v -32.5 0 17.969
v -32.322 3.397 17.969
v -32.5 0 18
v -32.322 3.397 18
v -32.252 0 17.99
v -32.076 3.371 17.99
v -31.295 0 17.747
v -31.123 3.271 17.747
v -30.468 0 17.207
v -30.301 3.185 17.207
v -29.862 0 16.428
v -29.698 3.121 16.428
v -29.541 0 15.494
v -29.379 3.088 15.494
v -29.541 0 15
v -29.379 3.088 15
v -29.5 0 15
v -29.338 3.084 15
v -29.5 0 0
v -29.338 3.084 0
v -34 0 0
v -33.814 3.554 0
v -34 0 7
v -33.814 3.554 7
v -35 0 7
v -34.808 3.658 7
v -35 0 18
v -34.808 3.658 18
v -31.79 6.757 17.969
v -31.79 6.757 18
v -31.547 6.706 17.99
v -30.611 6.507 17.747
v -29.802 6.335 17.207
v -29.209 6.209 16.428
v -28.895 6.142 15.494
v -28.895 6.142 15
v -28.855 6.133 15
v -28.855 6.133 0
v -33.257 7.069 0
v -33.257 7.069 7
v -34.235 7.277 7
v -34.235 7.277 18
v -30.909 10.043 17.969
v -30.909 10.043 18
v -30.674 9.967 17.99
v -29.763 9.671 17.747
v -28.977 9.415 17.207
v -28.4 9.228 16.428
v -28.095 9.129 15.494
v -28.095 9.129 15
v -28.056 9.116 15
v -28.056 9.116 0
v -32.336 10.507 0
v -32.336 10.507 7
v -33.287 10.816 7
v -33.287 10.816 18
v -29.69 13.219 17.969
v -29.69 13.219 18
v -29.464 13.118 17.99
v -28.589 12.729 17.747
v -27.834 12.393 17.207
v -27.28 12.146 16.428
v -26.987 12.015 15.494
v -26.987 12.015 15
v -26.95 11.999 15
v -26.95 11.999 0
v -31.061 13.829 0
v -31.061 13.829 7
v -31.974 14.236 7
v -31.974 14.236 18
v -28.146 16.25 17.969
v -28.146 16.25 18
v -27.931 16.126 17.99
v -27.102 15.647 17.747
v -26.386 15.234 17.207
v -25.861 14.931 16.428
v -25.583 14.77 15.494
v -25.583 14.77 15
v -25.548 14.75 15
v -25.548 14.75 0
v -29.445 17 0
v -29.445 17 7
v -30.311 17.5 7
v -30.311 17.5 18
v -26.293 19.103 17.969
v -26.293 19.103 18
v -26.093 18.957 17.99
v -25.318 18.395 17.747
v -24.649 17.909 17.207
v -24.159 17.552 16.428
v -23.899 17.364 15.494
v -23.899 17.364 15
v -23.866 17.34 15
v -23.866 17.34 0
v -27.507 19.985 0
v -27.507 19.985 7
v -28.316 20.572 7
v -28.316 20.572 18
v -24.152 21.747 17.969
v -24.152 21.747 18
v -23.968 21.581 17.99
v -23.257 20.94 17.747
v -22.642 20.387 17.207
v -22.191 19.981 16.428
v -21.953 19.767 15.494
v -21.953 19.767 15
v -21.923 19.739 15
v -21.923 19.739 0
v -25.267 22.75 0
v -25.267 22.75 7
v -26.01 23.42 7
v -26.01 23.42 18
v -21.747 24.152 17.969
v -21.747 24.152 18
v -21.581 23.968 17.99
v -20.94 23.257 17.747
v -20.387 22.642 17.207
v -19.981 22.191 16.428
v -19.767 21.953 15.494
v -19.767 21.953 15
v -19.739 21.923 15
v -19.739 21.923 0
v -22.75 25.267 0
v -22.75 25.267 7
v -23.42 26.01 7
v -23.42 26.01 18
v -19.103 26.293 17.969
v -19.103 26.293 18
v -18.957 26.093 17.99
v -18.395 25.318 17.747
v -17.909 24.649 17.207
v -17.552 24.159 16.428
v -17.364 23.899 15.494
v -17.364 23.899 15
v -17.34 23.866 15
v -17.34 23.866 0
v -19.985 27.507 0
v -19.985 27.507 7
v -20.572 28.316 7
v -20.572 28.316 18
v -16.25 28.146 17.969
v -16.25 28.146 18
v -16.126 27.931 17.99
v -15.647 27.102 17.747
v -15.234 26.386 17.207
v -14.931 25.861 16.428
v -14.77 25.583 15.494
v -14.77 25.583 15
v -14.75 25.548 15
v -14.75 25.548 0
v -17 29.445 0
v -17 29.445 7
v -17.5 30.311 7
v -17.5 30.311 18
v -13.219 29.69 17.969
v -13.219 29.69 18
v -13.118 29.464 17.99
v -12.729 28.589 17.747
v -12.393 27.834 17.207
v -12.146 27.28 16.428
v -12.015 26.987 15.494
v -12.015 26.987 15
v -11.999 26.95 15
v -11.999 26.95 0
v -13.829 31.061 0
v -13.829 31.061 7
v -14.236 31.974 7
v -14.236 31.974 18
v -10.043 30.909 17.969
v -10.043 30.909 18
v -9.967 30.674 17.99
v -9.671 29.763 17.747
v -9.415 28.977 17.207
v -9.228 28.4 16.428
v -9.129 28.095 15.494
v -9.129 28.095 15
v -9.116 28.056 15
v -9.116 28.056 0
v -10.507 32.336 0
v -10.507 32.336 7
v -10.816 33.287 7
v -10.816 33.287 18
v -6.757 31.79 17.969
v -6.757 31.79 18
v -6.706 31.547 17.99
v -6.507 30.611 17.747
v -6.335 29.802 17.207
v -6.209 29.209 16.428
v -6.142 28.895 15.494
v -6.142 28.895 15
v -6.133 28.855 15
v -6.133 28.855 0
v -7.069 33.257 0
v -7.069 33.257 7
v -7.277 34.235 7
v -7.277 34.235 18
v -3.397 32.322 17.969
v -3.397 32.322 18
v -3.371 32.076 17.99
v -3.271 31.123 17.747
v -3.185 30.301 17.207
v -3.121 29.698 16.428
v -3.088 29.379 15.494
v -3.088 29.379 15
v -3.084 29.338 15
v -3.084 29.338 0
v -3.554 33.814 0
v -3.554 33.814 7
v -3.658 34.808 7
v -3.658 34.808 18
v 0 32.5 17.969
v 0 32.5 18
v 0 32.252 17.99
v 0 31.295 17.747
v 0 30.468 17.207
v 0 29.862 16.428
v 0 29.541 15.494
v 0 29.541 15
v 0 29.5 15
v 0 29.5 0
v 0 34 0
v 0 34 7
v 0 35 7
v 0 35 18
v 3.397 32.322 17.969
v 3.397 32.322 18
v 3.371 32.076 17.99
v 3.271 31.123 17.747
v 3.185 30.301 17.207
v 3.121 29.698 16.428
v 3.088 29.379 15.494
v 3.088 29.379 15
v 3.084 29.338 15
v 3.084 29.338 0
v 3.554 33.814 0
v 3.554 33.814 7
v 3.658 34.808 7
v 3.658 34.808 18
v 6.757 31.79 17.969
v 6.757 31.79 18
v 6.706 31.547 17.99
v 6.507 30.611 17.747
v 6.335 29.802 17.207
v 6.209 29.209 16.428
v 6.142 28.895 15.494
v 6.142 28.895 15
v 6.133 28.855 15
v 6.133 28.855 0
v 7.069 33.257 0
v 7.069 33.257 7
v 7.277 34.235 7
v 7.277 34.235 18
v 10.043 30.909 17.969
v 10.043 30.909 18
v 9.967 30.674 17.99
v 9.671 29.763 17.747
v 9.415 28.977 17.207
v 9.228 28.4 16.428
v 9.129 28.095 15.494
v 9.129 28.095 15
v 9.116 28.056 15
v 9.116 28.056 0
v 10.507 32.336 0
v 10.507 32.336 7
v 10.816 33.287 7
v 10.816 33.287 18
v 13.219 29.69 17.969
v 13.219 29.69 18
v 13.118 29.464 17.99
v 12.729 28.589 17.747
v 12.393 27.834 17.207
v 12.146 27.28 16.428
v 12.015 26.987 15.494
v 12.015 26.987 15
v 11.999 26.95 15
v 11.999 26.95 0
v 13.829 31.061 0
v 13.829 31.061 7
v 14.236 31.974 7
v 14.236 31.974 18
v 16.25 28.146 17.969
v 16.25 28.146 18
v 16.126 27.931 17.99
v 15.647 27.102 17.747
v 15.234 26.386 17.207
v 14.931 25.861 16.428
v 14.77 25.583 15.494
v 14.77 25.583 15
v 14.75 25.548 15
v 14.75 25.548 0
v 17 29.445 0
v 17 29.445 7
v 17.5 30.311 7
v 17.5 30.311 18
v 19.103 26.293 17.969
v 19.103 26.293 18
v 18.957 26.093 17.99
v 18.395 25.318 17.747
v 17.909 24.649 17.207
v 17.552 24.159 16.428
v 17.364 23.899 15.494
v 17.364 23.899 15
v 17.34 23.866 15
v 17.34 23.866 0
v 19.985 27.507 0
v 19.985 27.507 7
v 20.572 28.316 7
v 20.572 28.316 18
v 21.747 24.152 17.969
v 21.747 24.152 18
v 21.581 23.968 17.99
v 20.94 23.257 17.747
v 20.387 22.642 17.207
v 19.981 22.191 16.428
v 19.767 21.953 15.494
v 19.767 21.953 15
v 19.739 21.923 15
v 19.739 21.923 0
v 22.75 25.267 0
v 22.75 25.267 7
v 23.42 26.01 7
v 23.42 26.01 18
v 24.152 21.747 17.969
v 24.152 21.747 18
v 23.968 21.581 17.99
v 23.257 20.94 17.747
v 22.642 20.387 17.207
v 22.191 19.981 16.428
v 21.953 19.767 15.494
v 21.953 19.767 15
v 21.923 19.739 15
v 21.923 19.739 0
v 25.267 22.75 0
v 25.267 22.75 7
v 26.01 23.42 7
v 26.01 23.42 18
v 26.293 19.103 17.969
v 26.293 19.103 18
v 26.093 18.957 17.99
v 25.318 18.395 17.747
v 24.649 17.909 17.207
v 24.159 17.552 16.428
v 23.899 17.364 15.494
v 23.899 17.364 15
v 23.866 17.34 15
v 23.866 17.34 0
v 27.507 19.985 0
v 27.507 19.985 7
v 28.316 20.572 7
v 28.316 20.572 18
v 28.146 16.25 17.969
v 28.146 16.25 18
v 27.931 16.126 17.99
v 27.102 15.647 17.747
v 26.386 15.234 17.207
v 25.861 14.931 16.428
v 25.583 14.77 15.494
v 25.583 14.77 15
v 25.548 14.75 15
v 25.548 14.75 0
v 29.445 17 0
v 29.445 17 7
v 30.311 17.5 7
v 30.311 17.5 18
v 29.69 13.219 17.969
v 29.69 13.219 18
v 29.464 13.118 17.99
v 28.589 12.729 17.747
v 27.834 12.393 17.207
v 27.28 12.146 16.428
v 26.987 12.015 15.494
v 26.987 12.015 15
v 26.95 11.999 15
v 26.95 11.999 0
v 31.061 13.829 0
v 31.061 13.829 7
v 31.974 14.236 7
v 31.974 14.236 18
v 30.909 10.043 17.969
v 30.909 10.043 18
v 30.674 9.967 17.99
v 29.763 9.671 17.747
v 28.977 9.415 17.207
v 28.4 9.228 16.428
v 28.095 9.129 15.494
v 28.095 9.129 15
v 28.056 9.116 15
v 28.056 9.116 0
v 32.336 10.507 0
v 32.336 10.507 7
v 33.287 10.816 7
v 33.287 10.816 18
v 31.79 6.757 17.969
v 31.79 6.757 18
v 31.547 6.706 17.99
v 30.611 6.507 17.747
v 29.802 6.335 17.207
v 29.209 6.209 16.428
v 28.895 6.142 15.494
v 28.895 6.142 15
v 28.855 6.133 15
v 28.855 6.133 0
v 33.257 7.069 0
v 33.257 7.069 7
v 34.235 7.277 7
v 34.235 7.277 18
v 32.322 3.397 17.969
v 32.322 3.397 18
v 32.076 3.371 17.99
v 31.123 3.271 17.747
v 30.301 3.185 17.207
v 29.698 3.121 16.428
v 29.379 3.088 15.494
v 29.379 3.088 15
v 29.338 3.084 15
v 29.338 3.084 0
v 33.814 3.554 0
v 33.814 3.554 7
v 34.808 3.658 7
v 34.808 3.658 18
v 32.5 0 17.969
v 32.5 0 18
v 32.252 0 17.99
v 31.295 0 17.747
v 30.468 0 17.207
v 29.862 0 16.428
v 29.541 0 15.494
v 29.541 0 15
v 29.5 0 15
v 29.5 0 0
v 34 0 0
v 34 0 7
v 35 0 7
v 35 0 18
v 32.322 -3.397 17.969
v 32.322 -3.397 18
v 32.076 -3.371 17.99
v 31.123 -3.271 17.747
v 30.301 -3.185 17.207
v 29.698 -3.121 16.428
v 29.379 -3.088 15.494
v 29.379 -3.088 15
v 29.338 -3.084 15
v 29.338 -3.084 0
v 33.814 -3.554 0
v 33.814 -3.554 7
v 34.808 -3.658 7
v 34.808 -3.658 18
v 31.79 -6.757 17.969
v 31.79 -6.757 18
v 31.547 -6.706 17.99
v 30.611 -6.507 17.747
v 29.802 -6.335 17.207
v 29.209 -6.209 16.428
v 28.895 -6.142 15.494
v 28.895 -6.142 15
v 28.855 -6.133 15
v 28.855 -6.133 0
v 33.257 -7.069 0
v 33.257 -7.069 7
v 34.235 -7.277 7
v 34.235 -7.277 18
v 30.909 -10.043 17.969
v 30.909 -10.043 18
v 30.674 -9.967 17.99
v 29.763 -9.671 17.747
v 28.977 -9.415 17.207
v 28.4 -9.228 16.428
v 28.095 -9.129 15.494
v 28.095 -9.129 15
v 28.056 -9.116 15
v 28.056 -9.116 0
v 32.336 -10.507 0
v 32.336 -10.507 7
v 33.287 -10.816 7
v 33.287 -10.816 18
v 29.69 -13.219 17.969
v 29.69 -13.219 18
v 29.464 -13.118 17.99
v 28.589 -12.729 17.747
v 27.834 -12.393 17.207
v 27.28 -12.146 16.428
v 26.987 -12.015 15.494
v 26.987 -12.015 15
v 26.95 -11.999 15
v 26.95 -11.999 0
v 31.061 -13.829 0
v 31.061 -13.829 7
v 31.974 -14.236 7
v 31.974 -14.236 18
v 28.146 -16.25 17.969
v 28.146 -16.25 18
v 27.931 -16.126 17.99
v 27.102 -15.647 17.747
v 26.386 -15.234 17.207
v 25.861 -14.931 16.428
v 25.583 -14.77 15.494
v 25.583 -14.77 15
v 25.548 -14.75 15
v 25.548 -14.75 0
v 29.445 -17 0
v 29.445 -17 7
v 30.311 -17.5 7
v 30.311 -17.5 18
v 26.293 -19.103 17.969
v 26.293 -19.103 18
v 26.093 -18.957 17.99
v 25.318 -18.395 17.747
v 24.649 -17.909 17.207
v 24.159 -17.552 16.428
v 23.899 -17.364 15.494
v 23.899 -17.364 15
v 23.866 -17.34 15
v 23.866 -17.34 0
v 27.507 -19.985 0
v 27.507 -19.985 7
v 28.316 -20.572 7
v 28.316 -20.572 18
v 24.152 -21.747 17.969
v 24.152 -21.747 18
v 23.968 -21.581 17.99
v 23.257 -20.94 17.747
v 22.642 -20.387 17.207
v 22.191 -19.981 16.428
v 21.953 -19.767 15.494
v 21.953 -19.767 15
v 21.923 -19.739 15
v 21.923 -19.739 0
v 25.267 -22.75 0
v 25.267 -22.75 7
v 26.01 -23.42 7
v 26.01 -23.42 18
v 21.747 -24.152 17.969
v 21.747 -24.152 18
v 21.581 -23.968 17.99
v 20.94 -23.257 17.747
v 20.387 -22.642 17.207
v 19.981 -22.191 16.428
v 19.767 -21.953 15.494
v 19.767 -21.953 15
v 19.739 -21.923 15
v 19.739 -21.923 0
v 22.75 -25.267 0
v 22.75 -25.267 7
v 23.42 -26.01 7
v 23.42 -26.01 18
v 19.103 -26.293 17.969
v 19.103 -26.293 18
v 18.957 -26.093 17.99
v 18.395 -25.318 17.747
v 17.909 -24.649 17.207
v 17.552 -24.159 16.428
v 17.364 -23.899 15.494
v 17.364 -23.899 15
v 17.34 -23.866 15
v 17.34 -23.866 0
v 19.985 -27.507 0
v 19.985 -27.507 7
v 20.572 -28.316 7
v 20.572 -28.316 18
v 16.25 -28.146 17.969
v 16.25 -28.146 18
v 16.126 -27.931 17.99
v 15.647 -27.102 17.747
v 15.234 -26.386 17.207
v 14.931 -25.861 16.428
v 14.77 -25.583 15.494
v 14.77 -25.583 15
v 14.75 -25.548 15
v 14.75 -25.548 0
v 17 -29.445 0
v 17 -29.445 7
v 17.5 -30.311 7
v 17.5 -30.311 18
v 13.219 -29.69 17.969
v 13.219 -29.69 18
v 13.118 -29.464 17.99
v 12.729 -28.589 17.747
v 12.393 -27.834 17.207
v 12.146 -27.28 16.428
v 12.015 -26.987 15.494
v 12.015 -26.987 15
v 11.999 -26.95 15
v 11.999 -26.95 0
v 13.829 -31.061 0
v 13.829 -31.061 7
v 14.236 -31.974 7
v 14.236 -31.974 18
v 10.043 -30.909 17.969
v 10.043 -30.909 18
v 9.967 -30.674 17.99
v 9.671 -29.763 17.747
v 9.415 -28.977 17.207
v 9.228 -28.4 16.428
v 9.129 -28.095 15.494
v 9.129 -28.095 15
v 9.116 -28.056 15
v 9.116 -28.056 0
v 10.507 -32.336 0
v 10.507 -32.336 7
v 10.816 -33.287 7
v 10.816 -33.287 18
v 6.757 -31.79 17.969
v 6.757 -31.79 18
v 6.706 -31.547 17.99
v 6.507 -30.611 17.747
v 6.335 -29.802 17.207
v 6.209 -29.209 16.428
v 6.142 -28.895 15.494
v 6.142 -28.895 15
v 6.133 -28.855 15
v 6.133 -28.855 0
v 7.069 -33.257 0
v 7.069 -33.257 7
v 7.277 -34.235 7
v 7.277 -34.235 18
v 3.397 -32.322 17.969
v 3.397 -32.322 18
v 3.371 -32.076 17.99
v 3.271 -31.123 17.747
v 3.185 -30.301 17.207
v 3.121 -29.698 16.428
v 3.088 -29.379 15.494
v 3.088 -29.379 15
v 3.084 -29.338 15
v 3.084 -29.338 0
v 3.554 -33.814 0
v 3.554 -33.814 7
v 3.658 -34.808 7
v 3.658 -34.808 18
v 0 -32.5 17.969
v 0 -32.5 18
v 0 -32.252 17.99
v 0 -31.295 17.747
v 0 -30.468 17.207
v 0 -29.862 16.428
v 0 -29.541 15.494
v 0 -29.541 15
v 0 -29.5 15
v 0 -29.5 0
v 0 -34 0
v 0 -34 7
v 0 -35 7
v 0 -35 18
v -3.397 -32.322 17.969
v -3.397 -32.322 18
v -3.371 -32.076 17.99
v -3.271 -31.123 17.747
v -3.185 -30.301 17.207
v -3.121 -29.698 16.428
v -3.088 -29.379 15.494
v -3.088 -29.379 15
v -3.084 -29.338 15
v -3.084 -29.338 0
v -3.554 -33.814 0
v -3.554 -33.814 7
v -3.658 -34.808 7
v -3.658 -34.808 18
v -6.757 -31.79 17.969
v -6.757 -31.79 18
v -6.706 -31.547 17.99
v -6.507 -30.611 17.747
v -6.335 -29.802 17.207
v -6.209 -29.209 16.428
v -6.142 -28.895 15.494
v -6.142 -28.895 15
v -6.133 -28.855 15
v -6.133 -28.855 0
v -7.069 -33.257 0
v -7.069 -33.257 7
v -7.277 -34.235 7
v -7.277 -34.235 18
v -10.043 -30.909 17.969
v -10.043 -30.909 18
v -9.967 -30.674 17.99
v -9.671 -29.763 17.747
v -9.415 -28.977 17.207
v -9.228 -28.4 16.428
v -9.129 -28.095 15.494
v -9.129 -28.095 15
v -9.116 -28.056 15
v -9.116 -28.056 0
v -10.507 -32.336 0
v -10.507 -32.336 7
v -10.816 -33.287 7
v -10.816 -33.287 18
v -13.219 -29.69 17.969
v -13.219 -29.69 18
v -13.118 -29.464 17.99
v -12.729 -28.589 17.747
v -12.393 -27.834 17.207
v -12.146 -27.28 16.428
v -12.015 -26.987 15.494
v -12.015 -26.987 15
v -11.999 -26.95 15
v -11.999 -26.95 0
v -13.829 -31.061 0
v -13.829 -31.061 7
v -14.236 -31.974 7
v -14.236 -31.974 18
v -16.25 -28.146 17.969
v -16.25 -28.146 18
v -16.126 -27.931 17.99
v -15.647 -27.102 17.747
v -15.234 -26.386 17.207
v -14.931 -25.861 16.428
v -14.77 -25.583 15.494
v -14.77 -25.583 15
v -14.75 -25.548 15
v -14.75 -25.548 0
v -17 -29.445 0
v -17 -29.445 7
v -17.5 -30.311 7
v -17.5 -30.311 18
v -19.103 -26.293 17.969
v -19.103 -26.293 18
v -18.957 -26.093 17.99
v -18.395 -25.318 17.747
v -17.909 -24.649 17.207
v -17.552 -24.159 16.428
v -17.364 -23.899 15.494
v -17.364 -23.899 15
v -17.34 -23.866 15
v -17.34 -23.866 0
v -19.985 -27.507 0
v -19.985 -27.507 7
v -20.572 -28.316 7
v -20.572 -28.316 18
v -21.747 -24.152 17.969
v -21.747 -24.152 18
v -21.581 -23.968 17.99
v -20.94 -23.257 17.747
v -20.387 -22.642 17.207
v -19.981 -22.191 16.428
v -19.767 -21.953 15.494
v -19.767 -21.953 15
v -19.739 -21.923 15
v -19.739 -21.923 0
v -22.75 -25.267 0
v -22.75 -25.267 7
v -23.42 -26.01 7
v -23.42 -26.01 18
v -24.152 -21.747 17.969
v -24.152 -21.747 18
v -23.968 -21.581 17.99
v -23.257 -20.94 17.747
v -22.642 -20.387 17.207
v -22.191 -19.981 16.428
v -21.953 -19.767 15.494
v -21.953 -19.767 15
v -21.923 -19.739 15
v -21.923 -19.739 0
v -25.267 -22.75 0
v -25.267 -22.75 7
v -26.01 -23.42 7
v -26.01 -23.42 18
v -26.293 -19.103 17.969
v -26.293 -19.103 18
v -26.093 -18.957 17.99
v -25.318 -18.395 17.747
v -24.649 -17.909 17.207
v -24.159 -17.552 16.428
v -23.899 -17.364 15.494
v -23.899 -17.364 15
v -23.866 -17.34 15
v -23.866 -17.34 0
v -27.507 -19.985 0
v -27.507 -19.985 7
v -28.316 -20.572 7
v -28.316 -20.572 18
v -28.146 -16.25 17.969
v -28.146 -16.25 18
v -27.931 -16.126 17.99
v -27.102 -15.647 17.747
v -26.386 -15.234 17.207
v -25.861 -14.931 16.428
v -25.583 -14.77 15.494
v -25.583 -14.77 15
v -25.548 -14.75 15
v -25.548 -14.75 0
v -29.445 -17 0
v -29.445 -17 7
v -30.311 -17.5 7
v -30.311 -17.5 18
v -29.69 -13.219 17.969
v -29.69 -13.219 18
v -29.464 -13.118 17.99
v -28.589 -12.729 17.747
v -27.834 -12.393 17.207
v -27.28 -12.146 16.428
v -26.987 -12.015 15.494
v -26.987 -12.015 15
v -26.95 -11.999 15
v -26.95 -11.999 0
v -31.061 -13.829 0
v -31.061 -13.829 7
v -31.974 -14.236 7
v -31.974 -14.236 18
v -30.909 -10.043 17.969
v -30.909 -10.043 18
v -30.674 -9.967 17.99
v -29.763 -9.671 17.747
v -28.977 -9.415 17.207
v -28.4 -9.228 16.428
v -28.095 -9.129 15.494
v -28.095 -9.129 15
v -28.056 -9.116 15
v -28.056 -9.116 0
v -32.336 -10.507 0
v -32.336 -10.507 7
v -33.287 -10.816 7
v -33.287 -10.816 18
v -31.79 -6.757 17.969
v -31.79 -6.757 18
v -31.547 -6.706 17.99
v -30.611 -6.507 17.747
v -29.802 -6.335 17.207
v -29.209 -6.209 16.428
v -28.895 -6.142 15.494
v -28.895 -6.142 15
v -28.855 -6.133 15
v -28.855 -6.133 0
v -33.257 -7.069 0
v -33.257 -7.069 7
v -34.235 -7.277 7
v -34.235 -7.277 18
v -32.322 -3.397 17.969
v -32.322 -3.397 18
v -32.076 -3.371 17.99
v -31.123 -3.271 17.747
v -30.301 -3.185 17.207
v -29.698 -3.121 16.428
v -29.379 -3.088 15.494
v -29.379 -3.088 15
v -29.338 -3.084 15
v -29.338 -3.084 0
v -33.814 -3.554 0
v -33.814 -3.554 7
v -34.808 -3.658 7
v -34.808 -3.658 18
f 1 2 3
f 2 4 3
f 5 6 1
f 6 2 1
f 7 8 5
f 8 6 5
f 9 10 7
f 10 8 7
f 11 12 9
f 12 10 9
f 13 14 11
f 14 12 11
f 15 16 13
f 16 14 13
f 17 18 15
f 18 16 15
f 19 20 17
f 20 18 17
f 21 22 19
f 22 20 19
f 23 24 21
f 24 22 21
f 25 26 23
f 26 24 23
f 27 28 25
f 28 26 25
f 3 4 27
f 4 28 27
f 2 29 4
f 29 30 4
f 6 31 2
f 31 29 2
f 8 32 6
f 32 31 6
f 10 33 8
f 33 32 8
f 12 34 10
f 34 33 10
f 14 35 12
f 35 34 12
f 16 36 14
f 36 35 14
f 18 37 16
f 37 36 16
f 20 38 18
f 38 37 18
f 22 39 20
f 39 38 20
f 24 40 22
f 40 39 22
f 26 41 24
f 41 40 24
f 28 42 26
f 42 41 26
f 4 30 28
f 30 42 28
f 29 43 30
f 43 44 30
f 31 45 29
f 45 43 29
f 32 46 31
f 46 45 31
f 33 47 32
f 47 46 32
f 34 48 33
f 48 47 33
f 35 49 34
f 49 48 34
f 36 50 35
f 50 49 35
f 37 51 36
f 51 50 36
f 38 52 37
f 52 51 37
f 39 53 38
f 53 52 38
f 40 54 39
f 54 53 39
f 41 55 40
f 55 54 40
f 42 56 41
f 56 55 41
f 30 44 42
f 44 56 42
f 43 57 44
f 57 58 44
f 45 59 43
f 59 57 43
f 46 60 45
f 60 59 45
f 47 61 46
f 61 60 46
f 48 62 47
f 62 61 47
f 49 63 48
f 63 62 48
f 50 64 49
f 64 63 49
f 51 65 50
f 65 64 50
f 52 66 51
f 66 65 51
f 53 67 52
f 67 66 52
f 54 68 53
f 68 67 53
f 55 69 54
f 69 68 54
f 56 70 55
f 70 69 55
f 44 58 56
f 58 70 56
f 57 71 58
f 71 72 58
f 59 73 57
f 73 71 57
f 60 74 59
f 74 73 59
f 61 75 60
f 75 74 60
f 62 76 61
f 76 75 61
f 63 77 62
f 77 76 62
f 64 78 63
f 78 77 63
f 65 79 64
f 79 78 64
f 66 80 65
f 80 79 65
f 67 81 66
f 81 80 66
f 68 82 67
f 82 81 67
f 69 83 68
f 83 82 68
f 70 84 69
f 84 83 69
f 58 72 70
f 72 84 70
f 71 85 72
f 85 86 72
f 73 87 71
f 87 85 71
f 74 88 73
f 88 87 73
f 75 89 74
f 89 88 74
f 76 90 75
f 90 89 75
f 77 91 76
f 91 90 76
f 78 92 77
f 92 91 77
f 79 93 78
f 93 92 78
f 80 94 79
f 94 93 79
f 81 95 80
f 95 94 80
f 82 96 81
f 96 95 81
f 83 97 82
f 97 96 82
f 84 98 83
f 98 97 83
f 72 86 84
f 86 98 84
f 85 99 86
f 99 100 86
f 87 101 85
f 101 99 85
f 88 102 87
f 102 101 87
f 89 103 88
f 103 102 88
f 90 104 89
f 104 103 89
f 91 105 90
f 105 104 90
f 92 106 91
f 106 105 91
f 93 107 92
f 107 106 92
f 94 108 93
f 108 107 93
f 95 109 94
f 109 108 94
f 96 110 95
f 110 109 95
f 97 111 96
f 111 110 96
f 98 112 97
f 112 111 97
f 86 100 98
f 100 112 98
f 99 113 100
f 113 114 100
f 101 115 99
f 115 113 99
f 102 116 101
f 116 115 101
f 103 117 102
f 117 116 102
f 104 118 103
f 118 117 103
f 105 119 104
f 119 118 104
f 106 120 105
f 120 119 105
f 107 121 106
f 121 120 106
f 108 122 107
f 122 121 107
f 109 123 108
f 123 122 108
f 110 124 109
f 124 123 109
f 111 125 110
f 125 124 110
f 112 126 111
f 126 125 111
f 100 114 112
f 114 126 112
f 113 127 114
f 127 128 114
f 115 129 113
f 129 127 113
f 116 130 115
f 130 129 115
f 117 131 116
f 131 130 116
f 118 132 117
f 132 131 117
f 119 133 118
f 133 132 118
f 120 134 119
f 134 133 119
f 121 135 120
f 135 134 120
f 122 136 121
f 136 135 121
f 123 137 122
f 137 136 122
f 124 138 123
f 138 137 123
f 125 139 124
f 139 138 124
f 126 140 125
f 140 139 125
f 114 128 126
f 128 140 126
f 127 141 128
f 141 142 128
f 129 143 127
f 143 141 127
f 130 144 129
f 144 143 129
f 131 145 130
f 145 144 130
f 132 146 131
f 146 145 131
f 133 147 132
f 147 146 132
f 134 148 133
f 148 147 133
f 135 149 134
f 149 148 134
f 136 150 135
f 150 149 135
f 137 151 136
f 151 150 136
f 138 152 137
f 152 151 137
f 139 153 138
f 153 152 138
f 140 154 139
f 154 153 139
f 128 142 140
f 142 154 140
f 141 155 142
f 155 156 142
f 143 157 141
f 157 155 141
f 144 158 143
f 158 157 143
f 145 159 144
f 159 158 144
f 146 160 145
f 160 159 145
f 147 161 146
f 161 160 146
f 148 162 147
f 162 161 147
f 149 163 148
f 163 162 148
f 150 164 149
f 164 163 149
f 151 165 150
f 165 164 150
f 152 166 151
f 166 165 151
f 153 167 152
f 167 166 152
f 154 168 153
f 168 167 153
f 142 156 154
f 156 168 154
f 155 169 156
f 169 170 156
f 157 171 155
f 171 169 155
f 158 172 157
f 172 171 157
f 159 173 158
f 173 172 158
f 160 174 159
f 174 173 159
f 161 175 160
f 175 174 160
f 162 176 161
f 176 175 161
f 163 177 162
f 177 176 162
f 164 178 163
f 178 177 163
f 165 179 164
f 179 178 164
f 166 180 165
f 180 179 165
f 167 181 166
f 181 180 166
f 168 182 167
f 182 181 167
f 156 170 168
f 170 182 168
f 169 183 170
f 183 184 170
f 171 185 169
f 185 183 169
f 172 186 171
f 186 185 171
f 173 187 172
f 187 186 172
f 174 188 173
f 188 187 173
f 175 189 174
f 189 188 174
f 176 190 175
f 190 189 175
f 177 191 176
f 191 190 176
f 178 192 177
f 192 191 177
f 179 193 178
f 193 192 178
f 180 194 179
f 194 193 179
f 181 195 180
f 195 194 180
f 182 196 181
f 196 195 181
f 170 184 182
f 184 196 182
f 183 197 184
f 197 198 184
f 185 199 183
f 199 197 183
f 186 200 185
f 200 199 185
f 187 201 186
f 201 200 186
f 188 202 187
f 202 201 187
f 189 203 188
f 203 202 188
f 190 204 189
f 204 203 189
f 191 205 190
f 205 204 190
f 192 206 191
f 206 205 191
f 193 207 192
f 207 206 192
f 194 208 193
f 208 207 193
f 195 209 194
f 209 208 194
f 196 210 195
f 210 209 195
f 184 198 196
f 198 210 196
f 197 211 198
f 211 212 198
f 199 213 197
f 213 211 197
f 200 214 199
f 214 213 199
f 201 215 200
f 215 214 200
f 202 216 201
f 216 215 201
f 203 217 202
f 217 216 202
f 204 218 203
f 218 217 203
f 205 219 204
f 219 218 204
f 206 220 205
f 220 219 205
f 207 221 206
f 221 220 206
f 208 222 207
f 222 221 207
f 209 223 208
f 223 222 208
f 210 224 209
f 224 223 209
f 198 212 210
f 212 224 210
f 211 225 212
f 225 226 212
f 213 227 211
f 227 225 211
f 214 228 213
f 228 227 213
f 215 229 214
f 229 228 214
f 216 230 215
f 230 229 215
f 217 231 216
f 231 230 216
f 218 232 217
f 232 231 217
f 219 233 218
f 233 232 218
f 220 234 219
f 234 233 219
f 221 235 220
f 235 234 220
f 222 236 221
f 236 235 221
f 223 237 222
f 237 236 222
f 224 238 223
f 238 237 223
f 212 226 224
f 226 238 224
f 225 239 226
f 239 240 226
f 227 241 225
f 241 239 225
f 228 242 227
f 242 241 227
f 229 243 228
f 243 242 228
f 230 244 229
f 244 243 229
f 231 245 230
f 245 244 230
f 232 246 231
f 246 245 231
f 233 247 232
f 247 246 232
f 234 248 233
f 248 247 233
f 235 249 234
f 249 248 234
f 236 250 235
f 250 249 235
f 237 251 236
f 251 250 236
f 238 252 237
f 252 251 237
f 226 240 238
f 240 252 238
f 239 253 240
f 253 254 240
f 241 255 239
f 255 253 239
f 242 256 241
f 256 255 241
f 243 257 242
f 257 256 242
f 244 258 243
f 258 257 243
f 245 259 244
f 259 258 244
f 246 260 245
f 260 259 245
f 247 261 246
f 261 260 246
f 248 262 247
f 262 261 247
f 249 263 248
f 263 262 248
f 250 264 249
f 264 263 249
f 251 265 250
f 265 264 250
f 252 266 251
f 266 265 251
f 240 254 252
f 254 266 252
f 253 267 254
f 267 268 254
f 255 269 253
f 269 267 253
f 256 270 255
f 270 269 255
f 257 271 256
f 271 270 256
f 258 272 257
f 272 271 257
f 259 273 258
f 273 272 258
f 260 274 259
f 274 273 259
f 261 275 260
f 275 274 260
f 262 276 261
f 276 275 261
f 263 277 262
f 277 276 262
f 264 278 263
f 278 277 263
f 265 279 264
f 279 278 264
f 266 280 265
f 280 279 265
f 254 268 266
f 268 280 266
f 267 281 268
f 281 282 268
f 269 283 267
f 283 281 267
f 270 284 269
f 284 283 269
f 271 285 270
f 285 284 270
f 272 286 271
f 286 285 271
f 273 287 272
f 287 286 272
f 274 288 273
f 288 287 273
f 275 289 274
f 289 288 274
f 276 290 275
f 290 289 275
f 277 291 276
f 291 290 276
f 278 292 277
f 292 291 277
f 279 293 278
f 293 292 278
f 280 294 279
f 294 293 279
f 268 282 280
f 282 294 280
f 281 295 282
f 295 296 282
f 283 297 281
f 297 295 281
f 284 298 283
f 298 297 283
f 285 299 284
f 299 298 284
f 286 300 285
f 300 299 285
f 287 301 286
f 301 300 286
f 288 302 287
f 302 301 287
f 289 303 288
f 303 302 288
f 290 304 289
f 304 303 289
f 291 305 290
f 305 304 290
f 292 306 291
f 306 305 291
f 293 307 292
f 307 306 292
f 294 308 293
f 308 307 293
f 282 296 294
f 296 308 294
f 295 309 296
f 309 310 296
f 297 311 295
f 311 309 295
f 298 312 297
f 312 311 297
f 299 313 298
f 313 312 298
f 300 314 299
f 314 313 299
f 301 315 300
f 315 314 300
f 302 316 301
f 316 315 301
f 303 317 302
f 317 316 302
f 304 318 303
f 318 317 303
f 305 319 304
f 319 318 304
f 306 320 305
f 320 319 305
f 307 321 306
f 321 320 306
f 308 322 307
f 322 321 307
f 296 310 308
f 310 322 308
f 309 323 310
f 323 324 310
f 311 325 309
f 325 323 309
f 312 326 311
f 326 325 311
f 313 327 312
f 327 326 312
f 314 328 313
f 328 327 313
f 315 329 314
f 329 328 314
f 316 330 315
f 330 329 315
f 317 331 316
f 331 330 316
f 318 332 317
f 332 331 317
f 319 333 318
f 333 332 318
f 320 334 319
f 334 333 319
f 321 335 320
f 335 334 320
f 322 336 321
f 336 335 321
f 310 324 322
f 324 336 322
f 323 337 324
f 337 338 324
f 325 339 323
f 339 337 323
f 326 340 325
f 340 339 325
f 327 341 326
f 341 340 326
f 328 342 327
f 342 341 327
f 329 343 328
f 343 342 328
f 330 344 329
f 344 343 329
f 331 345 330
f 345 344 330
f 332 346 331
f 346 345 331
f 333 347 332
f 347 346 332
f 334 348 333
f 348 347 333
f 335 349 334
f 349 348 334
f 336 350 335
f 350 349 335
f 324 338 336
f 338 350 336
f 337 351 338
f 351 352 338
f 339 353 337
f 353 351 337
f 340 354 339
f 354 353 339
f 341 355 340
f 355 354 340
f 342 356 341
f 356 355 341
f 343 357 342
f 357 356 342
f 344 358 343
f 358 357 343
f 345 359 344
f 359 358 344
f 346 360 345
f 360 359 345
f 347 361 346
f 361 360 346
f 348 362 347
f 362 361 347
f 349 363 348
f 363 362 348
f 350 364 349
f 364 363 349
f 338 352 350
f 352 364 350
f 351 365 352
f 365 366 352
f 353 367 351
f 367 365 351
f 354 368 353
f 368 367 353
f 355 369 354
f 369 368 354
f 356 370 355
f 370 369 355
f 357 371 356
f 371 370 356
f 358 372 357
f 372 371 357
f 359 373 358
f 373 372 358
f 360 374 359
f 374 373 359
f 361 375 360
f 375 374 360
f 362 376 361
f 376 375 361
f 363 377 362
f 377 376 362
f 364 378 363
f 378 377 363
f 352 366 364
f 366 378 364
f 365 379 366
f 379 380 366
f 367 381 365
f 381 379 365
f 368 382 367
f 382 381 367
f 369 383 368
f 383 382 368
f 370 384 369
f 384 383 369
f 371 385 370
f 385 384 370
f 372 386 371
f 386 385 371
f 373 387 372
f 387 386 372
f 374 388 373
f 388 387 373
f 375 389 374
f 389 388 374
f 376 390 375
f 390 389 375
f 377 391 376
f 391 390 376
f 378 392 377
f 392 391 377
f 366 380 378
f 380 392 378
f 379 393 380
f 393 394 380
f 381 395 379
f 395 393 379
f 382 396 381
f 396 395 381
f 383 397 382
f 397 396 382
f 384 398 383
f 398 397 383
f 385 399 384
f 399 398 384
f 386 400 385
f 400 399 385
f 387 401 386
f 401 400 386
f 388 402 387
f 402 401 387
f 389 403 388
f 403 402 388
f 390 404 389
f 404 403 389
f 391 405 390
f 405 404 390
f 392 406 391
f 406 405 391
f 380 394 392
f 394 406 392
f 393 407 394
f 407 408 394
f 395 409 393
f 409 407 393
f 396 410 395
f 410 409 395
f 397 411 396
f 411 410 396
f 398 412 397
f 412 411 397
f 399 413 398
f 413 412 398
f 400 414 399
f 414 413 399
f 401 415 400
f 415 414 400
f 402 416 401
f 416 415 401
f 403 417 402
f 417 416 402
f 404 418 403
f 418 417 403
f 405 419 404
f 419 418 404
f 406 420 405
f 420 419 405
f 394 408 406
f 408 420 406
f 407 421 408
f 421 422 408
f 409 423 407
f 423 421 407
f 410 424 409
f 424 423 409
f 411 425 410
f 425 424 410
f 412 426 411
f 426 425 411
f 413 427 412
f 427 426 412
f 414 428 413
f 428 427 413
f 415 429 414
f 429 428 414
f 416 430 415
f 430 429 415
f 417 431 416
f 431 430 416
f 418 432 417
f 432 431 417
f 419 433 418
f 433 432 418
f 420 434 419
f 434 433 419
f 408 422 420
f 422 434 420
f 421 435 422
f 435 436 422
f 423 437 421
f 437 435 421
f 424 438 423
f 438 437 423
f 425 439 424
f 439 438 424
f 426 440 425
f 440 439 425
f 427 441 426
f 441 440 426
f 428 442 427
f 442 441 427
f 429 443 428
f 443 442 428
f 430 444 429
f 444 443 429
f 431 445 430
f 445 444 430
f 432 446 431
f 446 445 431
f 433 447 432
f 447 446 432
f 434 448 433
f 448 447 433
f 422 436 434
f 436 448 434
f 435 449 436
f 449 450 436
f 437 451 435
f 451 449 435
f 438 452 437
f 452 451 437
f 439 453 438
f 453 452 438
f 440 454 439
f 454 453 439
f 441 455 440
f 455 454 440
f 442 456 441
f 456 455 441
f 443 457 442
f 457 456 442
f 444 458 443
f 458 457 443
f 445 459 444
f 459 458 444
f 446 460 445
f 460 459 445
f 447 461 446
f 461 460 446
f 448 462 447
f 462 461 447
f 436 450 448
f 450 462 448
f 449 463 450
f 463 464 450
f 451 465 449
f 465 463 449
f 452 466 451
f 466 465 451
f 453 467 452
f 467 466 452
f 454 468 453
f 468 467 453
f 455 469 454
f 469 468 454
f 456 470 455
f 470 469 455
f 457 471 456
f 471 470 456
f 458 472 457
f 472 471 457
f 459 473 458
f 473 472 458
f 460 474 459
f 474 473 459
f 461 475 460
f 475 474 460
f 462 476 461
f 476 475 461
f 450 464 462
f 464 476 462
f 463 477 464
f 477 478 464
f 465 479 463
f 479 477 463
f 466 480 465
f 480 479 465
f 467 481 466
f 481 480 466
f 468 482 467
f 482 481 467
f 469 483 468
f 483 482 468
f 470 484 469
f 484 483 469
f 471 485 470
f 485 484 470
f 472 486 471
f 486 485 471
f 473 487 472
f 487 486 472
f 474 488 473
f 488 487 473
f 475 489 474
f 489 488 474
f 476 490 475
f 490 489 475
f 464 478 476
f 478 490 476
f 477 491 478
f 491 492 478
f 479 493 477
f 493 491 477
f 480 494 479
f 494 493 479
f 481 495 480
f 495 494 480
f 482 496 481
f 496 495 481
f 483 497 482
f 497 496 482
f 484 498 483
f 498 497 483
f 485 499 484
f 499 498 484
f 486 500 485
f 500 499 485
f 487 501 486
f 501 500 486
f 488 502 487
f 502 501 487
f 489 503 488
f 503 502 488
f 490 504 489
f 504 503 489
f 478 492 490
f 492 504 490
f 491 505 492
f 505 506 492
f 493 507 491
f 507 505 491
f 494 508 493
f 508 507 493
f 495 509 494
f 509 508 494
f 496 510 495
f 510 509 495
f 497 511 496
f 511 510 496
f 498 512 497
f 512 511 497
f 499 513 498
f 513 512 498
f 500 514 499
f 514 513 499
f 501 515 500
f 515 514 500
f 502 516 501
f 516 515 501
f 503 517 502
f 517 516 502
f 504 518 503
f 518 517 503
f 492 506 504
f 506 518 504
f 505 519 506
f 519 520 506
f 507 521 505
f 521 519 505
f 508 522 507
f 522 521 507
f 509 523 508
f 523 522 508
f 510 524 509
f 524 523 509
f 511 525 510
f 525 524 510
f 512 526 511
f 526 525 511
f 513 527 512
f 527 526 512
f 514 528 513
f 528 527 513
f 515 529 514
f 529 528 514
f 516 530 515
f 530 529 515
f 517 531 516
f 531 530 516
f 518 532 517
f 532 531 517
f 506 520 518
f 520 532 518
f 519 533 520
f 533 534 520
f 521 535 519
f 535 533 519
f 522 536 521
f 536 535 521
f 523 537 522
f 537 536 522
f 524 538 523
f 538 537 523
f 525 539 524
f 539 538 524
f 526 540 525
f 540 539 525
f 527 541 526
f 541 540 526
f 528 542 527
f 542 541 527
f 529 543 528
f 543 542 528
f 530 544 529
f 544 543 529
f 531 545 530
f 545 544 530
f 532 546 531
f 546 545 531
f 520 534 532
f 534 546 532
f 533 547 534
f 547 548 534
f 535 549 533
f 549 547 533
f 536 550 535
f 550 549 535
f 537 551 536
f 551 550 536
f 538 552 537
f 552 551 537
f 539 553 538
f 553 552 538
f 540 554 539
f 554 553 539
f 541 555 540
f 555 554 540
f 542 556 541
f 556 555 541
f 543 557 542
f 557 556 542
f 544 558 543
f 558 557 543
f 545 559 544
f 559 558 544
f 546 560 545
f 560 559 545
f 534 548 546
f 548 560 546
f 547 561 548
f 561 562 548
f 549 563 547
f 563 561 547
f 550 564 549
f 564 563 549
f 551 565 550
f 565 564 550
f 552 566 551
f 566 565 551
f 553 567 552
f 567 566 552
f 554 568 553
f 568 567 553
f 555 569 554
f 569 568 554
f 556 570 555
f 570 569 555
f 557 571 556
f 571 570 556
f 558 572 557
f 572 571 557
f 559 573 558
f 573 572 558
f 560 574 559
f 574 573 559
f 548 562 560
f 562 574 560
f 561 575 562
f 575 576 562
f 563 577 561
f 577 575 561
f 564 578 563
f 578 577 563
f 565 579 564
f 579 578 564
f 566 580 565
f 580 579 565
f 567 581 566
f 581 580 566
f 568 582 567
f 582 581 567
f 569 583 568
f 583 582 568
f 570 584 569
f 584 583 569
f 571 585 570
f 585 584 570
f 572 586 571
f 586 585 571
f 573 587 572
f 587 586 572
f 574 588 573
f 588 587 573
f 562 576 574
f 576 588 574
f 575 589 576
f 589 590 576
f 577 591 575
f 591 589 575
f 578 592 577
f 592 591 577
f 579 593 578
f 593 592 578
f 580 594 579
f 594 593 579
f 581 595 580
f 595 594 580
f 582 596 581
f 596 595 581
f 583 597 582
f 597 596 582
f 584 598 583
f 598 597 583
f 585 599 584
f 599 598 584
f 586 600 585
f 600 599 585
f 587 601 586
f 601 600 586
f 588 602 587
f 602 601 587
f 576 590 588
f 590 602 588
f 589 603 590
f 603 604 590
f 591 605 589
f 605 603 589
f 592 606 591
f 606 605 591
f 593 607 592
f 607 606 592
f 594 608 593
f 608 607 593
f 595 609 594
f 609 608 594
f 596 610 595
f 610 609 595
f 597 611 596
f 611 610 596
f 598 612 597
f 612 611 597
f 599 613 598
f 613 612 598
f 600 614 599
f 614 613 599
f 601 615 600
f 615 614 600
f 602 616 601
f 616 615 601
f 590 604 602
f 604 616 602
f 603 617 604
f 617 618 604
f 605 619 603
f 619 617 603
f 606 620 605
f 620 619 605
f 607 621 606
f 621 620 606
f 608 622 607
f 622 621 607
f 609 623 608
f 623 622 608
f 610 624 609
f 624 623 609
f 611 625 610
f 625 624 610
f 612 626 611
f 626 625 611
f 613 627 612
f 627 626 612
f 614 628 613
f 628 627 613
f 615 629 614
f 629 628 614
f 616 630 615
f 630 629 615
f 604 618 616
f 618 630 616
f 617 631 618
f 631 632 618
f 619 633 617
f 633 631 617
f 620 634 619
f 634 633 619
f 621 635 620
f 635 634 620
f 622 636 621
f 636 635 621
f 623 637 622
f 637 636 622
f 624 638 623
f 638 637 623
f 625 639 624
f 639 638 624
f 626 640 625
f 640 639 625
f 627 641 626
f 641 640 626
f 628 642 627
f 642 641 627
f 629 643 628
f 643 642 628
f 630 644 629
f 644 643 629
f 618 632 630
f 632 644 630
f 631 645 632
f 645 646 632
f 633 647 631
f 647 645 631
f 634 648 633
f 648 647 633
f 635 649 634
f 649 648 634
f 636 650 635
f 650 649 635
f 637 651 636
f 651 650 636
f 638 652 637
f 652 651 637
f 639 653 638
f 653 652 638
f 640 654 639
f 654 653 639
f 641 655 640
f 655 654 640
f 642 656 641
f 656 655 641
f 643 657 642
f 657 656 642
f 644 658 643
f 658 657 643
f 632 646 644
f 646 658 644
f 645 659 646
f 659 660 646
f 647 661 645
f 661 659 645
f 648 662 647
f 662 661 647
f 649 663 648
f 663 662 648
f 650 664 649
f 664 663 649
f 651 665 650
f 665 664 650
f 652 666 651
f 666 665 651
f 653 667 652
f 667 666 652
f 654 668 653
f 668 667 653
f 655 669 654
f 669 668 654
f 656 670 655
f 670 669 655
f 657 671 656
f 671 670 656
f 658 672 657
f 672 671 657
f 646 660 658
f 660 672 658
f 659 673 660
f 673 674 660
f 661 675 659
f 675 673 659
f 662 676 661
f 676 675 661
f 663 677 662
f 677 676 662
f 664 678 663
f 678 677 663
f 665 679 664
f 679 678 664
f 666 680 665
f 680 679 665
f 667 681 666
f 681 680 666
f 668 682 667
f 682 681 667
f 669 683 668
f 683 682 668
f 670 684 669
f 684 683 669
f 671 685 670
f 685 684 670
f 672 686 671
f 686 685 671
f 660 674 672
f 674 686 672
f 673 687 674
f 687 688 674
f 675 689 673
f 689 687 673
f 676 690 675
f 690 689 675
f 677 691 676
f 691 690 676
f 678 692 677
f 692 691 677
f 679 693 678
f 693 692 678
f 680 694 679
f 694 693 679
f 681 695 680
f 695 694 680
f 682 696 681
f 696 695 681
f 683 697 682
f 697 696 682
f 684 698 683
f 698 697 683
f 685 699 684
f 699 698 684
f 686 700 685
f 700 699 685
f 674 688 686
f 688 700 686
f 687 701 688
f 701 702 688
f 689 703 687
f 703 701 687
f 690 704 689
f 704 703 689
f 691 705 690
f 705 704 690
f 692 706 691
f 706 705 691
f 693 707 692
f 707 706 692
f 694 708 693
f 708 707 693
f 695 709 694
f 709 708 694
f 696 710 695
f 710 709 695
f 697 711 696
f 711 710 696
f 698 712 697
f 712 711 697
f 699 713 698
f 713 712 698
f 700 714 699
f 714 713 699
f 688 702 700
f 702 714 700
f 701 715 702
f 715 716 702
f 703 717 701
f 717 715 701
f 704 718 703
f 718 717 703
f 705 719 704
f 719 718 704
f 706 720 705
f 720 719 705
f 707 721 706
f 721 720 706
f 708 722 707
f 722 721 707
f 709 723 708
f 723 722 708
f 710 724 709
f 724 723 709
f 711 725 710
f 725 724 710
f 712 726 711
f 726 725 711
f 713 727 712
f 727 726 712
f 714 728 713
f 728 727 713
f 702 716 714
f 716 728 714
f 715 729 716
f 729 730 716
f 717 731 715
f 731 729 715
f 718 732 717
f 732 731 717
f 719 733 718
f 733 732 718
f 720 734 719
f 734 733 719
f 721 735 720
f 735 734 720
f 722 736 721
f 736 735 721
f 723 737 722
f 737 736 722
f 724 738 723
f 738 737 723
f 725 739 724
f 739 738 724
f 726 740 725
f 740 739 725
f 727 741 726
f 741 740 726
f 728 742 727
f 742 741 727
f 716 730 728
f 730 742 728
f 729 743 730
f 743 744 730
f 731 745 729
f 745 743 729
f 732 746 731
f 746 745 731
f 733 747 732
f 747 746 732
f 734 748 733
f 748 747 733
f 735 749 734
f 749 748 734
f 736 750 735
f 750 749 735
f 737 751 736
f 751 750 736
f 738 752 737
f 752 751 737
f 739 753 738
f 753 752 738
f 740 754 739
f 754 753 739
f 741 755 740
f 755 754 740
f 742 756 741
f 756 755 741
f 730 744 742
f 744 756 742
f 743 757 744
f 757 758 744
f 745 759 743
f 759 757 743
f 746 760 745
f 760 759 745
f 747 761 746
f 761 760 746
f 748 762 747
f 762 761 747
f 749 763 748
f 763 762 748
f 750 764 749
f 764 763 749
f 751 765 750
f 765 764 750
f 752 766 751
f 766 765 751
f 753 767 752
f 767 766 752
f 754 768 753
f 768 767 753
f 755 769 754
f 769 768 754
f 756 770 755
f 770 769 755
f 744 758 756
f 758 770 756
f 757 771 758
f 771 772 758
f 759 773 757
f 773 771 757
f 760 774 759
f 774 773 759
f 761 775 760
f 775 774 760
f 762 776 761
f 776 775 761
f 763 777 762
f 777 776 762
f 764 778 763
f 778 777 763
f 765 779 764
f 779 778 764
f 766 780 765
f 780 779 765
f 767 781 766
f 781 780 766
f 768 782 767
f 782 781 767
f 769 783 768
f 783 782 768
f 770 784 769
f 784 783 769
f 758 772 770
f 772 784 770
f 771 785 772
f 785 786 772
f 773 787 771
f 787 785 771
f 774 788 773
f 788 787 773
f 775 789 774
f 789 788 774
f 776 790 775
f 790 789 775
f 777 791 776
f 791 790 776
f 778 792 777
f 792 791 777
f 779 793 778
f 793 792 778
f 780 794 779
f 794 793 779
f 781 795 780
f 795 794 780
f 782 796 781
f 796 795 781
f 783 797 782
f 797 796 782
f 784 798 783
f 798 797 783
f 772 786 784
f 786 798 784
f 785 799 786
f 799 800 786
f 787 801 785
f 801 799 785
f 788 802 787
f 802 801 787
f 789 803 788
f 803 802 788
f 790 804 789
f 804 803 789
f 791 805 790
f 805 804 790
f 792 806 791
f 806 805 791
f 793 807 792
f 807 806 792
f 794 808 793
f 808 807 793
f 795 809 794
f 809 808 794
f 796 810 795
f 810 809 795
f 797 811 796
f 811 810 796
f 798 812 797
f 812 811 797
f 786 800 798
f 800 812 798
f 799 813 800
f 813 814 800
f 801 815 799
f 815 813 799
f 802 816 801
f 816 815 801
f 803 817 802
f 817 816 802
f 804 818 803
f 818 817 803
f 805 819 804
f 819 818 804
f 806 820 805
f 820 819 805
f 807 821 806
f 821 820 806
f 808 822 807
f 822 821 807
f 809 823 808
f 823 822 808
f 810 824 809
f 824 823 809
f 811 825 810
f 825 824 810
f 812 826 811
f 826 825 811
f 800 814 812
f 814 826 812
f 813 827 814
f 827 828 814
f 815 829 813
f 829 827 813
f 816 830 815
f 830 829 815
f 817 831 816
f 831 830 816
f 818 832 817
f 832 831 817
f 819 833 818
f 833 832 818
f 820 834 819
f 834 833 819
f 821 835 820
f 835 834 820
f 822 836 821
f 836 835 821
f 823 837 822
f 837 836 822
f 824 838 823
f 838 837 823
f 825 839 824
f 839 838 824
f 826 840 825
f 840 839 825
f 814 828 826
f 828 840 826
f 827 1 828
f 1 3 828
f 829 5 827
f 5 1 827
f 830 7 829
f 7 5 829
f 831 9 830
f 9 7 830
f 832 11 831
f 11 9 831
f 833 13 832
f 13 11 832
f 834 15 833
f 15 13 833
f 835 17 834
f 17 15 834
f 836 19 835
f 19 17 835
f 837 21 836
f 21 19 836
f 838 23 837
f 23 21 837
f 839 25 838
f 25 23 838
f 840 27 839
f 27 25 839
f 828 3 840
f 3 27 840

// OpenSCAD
$fs=$fs/2;
$fa=$fa/2;

r = 3;
r2 = 59/2;


rotate_extrude(){
    translate([r2,0,0]) square([4.5,7]);
    translate([r2,7,0]) square([5.5,11-r]);
    translate([r2+r,7,0]) square([5.5-r,11]);
    translate([r2+r,11+7-r,0]) difference(){
        circle (r);
        translate([2.5,-3])square([5.5,11-r]);
    }
}
